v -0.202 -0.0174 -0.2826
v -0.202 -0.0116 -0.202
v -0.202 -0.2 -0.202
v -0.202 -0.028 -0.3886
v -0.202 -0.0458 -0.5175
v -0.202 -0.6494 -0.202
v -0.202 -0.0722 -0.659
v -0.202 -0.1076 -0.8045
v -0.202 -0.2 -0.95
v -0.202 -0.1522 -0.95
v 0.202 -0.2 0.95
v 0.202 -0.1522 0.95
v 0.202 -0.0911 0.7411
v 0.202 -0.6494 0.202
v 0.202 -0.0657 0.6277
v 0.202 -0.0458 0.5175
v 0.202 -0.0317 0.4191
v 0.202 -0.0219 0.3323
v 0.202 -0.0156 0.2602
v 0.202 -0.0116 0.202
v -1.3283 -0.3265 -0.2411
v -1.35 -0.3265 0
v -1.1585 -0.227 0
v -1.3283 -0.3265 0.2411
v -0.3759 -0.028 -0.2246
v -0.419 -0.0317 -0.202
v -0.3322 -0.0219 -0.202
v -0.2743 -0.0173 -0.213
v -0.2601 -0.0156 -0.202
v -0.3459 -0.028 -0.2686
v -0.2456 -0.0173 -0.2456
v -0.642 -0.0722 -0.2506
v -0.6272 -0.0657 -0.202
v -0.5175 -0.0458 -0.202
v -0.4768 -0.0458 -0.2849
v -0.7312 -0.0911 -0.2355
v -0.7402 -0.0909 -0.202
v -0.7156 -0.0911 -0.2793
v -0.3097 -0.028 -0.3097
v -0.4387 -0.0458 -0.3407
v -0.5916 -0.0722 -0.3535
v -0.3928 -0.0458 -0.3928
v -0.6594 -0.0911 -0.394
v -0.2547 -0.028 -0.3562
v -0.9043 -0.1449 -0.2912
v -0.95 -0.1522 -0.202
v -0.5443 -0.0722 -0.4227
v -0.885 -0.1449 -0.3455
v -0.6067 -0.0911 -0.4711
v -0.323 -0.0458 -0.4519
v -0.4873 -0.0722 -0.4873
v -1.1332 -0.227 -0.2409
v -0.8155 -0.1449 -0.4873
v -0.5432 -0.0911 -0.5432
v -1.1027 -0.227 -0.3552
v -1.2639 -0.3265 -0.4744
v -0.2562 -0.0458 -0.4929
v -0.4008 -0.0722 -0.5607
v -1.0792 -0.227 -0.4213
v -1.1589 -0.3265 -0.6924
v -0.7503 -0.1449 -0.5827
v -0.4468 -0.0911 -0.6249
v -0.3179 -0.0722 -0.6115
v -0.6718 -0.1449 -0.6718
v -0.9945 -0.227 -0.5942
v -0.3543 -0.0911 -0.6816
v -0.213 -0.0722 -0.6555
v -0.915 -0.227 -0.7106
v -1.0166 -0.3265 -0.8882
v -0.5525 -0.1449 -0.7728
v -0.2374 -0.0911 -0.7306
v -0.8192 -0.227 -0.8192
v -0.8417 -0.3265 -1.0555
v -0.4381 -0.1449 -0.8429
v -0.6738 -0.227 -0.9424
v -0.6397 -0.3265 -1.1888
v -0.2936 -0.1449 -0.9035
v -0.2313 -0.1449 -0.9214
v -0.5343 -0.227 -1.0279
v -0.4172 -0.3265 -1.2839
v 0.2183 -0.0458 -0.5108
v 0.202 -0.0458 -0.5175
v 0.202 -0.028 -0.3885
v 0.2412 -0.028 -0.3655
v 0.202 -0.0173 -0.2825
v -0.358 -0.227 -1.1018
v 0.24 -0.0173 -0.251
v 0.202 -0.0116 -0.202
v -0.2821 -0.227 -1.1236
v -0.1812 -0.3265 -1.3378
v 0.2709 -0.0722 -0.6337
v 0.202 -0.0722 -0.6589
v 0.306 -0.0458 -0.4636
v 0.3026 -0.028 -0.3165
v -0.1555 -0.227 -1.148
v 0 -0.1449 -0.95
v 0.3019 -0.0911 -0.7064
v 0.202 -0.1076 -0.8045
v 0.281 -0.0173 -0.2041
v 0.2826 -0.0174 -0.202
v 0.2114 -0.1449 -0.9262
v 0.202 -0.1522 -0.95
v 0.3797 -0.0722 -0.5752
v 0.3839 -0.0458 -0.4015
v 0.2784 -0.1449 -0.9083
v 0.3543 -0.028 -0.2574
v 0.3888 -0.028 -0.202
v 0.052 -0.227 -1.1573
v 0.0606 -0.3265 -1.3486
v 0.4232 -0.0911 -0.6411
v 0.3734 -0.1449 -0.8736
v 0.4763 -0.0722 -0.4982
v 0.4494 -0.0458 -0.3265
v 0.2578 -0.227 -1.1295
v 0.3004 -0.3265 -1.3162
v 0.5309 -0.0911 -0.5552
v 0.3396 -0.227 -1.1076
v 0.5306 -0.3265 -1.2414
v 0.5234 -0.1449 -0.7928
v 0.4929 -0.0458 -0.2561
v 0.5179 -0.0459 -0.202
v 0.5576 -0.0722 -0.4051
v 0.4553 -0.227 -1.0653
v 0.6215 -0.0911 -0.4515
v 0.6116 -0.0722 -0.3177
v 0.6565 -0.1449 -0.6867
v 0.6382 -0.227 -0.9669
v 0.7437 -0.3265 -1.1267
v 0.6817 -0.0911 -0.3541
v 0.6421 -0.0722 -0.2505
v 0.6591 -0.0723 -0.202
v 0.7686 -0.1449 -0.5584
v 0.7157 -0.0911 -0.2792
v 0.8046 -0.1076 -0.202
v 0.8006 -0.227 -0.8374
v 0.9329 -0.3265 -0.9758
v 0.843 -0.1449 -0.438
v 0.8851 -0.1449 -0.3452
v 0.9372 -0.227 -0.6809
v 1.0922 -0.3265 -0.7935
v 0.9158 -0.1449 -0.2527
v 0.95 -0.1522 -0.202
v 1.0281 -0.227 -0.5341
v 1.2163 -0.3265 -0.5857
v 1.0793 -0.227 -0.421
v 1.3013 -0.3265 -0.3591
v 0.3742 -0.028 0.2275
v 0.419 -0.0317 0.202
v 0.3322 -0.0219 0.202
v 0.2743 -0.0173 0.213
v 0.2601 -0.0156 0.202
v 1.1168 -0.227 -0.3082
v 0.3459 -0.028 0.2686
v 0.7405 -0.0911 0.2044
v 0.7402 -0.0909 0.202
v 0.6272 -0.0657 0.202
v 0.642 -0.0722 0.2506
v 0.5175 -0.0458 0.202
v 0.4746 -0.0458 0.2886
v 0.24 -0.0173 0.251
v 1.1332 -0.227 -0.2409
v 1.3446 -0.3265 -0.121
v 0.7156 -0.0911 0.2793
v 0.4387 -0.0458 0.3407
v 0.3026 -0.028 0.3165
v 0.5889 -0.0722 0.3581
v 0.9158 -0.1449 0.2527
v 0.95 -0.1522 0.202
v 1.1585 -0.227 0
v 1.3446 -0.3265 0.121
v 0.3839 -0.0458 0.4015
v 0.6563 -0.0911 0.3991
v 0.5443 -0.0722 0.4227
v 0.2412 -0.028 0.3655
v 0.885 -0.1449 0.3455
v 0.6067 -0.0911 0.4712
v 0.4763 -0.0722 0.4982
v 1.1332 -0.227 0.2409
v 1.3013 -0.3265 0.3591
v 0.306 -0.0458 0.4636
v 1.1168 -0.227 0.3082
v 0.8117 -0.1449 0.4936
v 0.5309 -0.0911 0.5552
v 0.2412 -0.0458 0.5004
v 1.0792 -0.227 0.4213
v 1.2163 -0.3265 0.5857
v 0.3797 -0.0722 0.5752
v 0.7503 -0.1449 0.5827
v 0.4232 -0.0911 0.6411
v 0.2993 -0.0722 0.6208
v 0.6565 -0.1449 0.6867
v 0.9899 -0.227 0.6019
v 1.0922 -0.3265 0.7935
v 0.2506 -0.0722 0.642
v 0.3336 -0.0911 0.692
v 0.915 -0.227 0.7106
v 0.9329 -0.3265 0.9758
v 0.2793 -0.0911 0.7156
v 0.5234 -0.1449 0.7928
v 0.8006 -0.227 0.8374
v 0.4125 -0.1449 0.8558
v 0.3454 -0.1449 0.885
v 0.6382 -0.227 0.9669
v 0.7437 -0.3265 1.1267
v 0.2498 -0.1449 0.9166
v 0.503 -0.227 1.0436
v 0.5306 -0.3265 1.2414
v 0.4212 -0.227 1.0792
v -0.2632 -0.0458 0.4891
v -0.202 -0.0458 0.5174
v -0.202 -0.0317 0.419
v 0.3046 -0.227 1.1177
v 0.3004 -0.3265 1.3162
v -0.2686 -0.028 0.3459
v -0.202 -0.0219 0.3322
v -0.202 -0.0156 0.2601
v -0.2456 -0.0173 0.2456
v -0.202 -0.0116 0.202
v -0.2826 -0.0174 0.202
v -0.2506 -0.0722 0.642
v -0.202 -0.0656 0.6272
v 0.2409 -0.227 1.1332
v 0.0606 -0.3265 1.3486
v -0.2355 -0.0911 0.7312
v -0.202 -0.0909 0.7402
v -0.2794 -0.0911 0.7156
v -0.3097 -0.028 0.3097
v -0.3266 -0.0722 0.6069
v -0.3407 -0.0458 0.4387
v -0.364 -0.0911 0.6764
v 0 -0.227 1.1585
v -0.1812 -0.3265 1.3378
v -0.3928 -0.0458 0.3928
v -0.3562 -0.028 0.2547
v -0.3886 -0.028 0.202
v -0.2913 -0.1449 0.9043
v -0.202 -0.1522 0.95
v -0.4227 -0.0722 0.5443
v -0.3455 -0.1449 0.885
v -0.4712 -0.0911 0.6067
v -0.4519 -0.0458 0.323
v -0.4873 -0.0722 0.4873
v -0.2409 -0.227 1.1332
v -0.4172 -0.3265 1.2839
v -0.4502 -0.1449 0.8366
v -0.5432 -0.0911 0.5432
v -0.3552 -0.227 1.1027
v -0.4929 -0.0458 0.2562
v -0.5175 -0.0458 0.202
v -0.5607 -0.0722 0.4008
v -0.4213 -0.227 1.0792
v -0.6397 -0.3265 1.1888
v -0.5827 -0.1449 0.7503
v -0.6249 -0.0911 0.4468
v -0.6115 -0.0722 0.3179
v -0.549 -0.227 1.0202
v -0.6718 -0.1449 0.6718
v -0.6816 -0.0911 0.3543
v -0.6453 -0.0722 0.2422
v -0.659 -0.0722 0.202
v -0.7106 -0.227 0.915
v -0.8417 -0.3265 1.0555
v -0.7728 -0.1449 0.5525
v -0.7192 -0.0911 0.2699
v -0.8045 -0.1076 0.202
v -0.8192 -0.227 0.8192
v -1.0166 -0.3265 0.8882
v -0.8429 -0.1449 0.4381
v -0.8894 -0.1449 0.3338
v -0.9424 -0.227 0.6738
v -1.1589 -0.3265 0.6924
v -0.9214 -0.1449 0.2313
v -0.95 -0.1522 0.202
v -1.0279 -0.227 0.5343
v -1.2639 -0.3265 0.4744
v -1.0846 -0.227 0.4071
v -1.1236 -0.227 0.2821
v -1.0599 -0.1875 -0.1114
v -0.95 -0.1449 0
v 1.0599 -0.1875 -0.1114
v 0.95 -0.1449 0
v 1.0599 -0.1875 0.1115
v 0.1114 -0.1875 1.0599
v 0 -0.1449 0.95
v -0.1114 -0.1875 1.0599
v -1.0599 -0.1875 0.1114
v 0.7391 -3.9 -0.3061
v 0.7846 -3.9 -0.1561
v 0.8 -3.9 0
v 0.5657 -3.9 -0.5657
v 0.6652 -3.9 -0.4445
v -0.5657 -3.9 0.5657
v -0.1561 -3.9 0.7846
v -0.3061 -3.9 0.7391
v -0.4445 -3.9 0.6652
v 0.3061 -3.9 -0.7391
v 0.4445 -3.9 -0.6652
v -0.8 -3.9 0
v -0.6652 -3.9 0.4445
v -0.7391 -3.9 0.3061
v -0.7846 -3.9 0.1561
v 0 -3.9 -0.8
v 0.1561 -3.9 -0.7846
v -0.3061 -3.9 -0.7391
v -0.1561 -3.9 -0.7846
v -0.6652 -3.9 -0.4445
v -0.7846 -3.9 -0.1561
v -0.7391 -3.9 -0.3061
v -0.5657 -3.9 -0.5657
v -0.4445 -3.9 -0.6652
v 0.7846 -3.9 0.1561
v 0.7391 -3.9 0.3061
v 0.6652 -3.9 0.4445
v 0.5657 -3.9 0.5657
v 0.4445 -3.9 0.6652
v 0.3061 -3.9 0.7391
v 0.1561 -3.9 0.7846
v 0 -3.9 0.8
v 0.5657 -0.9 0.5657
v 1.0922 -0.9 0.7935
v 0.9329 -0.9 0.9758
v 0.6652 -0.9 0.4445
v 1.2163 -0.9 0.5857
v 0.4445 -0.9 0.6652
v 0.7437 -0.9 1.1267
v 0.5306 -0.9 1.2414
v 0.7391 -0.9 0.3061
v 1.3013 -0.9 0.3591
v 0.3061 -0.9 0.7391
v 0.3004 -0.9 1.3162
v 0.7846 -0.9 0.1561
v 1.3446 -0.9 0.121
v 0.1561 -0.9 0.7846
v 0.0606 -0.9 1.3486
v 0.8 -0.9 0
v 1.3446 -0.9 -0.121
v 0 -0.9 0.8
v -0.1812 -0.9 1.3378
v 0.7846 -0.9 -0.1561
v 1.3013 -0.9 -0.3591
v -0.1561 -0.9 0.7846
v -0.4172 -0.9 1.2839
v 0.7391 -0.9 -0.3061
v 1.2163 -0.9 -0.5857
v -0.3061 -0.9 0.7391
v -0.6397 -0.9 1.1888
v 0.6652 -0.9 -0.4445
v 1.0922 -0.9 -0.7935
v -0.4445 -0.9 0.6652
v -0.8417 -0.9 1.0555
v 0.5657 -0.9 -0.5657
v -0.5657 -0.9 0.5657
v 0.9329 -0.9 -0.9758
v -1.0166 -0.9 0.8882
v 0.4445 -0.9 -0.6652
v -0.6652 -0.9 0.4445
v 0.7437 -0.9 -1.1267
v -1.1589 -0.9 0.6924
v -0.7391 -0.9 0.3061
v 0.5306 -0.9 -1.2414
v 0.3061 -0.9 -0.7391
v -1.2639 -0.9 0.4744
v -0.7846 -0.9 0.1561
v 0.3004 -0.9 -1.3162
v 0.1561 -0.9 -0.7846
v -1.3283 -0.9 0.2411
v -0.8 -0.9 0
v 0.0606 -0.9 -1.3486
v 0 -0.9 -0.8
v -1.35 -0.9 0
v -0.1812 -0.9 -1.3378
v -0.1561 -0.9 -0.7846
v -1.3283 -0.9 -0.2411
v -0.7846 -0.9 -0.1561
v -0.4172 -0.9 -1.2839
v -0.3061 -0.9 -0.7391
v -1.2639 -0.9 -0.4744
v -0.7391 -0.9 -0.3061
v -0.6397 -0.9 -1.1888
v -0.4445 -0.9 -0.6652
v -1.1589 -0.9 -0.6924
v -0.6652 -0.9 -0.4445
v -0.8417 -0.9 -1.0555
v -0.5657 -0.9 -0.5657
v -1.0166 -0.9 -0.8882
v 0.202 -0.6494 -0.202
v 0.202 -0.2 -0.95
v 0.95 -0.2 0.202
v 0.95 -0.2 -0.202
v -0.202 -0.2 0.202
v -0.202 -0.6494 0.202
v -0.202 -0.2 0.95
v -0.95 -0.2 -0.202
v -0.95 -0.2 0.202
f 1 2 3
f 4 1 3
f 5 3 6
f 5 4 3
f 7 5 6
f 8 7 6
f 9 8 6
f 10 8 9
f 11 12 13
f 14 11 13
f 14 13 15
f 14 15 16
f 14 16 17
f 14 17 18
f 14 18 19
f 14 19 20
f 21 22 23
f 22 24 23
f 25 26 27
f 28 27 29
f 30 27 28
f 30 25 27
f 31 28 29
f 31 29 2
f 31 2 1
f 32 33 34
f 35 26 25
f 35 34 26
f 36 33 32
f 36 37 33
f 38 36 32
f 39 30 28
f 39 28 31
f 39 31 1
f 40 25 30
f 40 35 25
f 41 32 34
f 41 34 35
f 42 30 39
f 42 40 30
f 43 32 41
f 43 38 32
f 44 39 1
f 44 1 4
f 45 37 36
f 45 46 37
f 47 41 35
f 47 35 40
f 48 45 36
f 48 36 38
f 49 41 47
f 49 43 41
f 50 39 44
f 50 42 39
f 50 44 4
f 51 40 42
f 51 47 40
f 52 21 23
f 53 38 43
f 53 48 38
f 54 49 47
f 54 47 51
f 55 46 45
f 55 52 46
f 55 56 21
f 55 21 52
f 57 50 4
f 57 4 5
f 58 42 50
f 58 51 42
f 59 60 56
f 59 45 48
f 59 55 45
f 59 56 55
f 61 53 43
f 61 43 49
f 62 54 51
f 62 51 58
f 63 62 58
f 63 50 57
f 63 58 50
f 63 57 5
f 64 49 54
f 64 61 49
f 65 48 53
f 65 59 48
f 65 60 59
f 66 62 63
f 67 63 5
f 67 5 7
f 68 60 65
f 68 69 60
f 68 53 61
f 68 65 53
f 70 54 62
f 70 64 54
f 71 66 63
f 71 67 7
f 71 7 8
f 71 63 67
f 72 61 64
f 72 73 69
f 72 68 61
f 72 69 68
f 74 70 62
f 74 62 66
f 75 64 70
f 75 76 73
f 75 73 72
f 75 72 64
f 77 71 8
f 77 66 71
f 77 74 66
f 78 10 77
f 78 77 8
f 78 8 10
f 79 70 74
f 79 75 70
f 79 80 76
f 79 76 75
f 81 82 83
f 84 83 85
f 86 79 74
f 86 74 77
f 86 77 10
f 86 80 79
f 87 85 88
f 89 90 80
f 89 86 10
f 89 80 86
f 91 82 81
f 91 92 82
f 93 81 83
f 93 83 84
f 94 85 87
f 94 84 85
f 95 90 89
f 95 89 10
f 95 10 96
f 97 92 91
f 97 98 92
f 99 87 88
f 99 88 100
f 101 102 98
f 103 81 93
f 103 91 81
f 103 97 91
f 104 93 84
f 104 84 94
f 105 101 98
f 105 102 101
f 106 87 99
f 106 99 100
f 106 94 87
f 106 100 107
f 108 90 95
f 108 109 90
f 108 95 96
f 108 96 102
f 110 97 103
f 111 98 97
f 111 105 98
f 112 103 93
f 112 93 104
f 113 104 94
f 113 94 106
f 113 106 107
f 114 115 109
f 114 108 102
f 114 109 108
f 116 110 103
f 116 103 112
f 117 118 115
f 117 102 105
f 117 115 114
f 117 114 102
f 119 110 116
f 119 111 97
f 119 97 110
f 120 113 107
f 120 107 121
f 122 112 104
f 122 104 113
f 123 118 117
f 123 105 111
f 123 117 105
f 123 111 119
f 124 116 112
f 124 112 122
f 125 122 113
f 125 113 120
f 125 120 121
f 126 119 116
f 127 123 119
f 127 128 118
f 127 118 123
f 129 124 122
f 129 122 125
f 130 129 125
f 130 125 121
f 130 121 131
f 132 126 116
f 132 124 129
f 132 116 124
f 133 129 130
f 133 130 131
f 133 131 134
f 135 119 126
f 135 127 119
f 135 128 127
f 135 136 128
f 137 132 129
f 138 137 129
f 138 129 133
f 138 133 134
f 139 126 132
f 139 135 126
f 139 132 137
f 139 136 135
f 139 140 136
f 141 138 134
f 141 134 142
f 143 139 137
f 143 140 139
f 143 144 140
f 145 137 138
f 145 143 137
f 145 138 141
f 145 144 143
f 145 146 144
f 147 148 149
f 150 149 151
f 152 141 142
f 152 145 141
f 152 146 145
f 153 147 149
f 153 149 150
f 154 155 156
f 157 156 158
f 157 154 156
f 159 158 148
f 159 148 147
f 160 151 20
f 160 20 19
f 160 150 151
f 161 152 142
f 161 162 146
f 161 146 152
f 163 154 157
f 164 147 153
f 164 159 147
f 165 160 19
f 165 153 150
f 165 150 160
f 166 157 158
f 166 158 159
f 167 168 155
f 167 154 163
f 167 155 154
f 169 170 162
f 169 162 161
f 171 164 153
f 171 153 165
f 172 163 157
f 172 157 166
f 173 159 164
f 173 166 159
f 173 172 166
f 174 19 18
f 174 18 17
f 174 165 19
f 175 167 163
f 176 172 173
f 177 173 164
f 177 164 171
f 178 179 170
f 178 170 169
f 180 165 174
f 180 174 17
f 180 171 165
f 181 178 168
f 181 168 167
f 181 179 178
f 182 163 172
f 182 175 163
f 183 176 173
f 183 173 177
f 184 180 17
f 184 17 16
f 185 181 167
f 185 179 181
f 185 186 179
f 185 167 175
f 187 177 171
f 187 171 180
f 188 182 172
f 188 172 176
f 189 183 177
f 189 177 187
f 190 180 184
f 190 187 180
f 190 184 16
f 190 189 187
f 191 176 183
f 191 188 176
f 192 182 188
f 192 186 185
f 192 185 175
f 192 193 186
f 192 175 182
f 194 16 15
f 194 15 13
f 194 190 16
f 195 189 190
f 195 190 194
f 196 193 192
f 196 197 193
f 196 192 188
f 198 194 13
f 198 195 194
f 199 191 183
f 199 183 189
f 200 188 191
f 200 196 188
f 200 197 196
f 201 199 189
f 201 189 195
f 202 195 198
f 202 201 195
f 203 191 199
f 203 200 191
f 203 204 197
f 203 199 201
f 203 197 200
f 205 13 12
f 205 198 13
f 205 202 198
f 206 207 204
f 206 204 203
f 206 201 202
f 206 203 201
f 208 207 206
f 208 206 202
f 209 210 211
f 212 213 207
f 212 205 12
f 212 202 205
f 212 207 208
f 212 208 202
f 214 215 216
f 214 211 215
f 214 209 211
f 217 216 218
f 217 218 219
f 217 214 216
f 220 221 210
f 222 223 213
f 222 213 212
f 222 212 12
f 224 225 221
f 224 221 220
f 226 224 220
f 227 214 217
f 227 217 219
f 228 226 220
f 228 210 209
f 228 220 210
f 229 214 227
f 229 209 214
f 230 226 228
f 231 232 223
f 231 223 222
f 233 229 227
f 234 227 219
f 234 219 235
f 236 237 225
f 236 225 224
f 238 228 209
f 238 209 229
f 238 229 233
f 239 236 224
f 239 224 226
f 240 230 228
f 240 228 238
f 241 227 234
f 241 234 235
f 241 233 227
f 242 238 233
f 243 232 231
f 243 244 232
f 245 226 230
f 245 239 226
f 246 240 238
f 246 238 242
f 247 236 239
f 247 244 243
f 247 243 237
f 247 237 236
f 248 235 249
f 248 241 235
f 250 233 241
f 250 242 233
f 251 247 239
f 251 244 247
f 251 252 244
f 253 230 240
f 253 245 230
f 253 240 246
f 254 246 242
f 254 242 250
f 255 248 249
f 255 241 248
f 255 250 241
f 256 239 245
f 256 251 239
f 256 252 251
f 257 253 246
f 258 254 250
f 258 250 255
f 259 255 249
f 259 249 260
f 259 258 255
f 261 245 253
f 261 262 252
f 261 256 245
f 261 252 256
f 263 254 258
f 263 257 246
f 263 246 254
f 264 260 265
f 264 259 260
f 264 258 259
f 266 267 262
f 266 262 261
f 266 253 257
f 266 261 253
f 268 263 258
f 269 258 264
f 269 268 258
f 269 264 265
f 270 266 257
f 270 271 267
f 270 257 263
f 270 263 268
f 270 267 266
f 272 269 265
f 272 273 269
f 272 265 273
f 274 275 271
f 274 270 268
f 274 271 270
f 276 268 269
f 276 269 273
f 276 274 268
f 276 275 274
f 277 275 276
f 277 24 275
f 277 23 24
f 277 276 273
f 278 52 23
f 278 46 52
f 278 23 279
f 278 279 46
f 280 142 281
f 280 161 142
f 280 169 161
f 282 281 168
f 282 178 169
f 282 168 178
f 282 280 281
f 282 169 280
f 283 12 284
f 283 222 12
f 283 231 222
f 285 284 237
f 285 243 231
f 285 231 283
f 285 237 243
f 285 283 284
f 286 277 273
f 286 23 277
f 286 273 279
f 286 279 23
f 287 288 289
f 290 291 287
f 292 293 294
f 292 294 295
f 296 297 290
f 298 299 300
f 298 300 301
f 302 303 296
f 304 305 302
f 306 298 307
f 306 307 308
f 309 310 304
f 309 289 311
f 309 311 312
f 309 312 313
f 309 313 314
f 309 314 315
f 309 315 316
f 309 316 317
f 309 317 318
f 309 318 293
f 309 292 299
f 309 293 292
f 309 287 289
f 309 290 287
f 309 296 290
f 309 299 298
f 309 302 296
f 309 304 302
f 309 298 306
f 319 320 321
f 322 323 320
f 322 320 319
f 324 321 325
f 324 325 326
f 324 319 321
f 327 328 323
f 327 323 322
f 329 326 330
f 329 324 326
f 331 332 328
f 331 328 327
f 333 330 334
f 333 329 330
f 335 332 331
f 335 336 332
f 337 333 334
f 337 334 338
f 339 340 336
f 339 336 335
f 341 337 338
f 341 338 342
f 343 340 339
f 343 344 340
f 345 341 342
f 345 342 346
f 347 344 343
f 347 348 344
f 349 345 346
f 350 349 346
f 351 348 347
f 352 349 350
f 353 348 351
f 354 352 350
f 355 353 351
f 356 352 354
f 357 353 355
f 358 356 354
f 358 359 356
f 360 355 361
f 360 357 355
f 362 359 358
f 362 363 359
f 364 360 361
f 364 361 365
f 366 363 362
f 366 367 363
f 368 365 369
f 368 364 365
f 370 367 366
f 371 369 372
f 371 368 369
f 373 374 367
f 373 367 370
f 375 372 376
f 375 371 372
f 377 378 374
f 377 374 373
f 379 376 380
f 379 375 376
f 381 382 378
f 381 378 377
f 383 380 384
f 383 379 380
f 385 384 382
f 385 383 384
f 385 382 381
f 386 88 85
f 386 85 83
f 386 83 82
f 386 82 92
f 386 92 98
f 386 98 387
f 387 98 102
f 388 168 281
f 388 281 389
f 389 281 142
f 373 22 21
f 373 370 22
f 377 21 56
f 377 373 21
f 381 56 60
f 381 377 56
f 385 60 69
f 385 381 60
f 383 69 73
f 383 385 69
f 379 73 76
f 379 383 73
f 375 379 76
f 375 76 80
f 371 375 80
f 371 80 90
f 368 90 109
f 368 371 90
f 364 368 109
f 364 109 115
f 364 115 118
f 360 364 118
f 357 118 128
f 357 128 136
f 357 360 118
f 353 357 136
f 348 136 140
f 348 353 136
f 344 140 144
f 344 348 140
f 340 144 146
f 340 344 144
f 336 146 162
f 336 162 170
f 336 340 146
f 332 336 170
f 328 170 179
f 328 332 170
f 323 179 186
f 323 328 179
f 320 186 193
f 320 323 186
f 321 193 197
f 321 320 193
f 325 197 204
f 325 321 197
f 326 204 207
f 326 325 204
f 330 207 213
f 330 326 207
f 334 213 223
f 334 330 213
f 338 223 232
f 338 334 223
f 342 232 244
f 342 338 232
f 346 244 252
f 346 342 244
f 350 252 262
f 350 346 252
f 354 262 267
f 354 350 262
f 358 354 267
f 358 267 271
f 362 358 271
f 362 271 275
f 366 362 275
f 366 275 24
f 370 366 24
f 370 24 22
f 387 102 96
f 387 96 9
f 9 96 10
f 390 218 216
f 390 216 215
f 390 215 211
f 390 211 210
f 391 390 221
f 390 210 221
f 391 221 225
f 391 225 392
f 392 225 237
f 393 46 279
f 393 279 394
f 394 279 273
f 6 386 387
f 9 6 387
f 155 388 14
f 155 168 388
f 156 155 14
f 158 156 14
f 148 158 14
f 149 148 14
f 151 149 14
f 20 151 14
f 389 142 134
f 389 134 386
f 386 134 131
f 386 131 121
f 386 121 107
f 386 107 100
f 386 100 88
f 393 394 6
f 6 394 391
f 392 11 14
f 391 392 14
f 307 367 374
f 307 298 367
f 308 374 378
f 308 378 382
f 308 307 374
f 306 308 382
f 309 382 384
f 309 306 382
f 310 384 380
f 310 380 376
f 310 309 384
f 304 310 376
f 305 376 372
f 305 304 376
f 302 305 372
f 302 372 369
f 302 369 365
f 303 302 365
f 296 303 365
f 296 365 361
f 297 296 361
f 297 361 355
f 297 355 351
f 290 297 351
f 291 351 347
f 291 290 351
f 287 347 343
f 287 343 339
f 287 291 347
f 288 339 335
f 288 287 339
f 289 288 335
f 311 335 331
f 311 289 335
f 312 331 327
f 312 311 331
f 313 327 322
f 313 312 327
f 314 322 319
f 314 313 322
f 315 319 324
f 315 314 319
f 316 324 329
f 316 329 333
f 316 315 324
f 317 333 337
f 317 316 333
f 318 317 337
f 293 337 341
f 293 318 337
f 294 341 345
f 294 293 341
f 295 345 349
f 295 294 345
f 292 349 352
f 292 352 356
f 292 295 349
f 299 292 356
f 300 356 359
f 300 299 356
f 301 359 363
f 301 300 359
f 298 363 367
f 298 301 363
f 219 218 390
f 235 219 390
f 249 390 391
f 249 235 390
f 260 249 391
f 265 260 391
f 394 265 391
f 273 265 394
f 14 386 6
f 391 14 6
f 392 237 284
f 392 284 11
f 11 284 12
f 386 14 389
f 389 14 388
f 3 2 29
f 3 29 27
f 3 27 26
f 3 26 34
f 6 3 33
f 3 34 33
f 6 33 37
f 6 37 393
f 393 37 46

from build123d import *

# Parameters (mm, degrees)
SKETCH_3_W               = 0.404003898
SKETCH_3_H               = 0.95
CUT_EXTRUDE_1_DEPTH      = 0.2
PATTERN_CIRCULAR_4_COUNT = 4
CUT_EXTRUDE_4_DEPTH      = 0.404003899
CUT_EXTRUDE_5_DEPTH      = 0.404003899
SKETCH_8_W               = 0.404003898
SKETCH_8_H               = 0.404003898
EXTRUDE_1_DEPTH          = 0.3


with BuildPart() as part:
    # 草图2 → 旋转1 (revolve)
    with BuildSketch(Plane.XY, mode=Mode.PRIVATE) as revolve_1_sk:
        with BuildLine():
            Line((1.35, -0.326458657), (1.35, -0.9))
            Line((1.35, -0.9), (0.8, -0.9))
            Line((0.8, -0.9), (0.8, -3.9))
            Line((0.8, -3.9), (0, -3.9))
            Line((0, -3.9), (0, 0))
            add(Edge.make_bspline(
                [(0, 0), (0.463191953, 0), (0.947298492, -0.088866646), (1.35, -0.326458657)],
                knots=[0, 0, 0, 0, 1, 1, 1, 1], degree=3))
        make_face()
    revolve(revolve_1_sk.sketch.rotate(Axis((0, 0, 0), (0, -1, 0)), 180), axis=Axis((0, 0, 0), (0, -1, 0)))

    # 草图3 → 切除-拉伸1 (cut)
    with BuildSketch(Plane(origin=(0, 0, 0), x_dir=(-1, 0, 0), z_dir=(0, -1, 0))):
        with Locations((0, 0.475)):
            Rectangle(SKETCH_3_W, SKETCH_3_H)
    cut_extrude_1 = extrude(amount=CUT_EXTRUDE_1_DEPTH, mode=Mode.SUBTRACT)

    # 阵列(圆周)4: 切除-拉伸1 ×4 about axis
    pattern_circular_4_axis = Axis((0, 0, 0), (0, 1, 0))
    for i in range(1, PATTERN_CIRCULAR_4_COUNT):
        add(cut_extrude_1.rotate(pattern_circular_4_axis, i * 360 / PATTERN_CIRCULAR_4_COUNT), mode=Mode.SUBTRACT)

    # 草图6 → 切除-拉伸4 (cut)
    with BuildSketch(Plane(origin=(0, 0, 0.202001949), x_dir=(-1, 0, 0), z_dir=(0, 0, -1))):
        Polygon((0.95, -0.2), (0, -0.770817588), (-0.95, -0.2), align=None)
    extrude(amount=CUT_EXTRUDE_4_DEPTH, mode=Mode.SUBTRACT)

    # 草图7 → 切除-拉伸5 (cut)
    with BuildSketch(Plane.ZY.offset(-0.202001949)):
        Polygon((0.95, -0.2), (0, -0.770817588), (-0.95, -0.2), align=None)
    extrude(amount=CUT_EXTRUDE_5_DEPTH, mode=Mode.SUBTRACT)

    # 草图8 → 凸台-拉伸1 (add)
    with BuildSketch(Plane(origin=(0, -0.649442572, 0), x_dir=(-1, 0, 0), z_dir=(0, -1, 0))):
        Rectangle(SKETCH_8_W, SKETCH_8_H)
    extrude(amount=EXTRUDE_1_DEPTH)


solid = part.part
